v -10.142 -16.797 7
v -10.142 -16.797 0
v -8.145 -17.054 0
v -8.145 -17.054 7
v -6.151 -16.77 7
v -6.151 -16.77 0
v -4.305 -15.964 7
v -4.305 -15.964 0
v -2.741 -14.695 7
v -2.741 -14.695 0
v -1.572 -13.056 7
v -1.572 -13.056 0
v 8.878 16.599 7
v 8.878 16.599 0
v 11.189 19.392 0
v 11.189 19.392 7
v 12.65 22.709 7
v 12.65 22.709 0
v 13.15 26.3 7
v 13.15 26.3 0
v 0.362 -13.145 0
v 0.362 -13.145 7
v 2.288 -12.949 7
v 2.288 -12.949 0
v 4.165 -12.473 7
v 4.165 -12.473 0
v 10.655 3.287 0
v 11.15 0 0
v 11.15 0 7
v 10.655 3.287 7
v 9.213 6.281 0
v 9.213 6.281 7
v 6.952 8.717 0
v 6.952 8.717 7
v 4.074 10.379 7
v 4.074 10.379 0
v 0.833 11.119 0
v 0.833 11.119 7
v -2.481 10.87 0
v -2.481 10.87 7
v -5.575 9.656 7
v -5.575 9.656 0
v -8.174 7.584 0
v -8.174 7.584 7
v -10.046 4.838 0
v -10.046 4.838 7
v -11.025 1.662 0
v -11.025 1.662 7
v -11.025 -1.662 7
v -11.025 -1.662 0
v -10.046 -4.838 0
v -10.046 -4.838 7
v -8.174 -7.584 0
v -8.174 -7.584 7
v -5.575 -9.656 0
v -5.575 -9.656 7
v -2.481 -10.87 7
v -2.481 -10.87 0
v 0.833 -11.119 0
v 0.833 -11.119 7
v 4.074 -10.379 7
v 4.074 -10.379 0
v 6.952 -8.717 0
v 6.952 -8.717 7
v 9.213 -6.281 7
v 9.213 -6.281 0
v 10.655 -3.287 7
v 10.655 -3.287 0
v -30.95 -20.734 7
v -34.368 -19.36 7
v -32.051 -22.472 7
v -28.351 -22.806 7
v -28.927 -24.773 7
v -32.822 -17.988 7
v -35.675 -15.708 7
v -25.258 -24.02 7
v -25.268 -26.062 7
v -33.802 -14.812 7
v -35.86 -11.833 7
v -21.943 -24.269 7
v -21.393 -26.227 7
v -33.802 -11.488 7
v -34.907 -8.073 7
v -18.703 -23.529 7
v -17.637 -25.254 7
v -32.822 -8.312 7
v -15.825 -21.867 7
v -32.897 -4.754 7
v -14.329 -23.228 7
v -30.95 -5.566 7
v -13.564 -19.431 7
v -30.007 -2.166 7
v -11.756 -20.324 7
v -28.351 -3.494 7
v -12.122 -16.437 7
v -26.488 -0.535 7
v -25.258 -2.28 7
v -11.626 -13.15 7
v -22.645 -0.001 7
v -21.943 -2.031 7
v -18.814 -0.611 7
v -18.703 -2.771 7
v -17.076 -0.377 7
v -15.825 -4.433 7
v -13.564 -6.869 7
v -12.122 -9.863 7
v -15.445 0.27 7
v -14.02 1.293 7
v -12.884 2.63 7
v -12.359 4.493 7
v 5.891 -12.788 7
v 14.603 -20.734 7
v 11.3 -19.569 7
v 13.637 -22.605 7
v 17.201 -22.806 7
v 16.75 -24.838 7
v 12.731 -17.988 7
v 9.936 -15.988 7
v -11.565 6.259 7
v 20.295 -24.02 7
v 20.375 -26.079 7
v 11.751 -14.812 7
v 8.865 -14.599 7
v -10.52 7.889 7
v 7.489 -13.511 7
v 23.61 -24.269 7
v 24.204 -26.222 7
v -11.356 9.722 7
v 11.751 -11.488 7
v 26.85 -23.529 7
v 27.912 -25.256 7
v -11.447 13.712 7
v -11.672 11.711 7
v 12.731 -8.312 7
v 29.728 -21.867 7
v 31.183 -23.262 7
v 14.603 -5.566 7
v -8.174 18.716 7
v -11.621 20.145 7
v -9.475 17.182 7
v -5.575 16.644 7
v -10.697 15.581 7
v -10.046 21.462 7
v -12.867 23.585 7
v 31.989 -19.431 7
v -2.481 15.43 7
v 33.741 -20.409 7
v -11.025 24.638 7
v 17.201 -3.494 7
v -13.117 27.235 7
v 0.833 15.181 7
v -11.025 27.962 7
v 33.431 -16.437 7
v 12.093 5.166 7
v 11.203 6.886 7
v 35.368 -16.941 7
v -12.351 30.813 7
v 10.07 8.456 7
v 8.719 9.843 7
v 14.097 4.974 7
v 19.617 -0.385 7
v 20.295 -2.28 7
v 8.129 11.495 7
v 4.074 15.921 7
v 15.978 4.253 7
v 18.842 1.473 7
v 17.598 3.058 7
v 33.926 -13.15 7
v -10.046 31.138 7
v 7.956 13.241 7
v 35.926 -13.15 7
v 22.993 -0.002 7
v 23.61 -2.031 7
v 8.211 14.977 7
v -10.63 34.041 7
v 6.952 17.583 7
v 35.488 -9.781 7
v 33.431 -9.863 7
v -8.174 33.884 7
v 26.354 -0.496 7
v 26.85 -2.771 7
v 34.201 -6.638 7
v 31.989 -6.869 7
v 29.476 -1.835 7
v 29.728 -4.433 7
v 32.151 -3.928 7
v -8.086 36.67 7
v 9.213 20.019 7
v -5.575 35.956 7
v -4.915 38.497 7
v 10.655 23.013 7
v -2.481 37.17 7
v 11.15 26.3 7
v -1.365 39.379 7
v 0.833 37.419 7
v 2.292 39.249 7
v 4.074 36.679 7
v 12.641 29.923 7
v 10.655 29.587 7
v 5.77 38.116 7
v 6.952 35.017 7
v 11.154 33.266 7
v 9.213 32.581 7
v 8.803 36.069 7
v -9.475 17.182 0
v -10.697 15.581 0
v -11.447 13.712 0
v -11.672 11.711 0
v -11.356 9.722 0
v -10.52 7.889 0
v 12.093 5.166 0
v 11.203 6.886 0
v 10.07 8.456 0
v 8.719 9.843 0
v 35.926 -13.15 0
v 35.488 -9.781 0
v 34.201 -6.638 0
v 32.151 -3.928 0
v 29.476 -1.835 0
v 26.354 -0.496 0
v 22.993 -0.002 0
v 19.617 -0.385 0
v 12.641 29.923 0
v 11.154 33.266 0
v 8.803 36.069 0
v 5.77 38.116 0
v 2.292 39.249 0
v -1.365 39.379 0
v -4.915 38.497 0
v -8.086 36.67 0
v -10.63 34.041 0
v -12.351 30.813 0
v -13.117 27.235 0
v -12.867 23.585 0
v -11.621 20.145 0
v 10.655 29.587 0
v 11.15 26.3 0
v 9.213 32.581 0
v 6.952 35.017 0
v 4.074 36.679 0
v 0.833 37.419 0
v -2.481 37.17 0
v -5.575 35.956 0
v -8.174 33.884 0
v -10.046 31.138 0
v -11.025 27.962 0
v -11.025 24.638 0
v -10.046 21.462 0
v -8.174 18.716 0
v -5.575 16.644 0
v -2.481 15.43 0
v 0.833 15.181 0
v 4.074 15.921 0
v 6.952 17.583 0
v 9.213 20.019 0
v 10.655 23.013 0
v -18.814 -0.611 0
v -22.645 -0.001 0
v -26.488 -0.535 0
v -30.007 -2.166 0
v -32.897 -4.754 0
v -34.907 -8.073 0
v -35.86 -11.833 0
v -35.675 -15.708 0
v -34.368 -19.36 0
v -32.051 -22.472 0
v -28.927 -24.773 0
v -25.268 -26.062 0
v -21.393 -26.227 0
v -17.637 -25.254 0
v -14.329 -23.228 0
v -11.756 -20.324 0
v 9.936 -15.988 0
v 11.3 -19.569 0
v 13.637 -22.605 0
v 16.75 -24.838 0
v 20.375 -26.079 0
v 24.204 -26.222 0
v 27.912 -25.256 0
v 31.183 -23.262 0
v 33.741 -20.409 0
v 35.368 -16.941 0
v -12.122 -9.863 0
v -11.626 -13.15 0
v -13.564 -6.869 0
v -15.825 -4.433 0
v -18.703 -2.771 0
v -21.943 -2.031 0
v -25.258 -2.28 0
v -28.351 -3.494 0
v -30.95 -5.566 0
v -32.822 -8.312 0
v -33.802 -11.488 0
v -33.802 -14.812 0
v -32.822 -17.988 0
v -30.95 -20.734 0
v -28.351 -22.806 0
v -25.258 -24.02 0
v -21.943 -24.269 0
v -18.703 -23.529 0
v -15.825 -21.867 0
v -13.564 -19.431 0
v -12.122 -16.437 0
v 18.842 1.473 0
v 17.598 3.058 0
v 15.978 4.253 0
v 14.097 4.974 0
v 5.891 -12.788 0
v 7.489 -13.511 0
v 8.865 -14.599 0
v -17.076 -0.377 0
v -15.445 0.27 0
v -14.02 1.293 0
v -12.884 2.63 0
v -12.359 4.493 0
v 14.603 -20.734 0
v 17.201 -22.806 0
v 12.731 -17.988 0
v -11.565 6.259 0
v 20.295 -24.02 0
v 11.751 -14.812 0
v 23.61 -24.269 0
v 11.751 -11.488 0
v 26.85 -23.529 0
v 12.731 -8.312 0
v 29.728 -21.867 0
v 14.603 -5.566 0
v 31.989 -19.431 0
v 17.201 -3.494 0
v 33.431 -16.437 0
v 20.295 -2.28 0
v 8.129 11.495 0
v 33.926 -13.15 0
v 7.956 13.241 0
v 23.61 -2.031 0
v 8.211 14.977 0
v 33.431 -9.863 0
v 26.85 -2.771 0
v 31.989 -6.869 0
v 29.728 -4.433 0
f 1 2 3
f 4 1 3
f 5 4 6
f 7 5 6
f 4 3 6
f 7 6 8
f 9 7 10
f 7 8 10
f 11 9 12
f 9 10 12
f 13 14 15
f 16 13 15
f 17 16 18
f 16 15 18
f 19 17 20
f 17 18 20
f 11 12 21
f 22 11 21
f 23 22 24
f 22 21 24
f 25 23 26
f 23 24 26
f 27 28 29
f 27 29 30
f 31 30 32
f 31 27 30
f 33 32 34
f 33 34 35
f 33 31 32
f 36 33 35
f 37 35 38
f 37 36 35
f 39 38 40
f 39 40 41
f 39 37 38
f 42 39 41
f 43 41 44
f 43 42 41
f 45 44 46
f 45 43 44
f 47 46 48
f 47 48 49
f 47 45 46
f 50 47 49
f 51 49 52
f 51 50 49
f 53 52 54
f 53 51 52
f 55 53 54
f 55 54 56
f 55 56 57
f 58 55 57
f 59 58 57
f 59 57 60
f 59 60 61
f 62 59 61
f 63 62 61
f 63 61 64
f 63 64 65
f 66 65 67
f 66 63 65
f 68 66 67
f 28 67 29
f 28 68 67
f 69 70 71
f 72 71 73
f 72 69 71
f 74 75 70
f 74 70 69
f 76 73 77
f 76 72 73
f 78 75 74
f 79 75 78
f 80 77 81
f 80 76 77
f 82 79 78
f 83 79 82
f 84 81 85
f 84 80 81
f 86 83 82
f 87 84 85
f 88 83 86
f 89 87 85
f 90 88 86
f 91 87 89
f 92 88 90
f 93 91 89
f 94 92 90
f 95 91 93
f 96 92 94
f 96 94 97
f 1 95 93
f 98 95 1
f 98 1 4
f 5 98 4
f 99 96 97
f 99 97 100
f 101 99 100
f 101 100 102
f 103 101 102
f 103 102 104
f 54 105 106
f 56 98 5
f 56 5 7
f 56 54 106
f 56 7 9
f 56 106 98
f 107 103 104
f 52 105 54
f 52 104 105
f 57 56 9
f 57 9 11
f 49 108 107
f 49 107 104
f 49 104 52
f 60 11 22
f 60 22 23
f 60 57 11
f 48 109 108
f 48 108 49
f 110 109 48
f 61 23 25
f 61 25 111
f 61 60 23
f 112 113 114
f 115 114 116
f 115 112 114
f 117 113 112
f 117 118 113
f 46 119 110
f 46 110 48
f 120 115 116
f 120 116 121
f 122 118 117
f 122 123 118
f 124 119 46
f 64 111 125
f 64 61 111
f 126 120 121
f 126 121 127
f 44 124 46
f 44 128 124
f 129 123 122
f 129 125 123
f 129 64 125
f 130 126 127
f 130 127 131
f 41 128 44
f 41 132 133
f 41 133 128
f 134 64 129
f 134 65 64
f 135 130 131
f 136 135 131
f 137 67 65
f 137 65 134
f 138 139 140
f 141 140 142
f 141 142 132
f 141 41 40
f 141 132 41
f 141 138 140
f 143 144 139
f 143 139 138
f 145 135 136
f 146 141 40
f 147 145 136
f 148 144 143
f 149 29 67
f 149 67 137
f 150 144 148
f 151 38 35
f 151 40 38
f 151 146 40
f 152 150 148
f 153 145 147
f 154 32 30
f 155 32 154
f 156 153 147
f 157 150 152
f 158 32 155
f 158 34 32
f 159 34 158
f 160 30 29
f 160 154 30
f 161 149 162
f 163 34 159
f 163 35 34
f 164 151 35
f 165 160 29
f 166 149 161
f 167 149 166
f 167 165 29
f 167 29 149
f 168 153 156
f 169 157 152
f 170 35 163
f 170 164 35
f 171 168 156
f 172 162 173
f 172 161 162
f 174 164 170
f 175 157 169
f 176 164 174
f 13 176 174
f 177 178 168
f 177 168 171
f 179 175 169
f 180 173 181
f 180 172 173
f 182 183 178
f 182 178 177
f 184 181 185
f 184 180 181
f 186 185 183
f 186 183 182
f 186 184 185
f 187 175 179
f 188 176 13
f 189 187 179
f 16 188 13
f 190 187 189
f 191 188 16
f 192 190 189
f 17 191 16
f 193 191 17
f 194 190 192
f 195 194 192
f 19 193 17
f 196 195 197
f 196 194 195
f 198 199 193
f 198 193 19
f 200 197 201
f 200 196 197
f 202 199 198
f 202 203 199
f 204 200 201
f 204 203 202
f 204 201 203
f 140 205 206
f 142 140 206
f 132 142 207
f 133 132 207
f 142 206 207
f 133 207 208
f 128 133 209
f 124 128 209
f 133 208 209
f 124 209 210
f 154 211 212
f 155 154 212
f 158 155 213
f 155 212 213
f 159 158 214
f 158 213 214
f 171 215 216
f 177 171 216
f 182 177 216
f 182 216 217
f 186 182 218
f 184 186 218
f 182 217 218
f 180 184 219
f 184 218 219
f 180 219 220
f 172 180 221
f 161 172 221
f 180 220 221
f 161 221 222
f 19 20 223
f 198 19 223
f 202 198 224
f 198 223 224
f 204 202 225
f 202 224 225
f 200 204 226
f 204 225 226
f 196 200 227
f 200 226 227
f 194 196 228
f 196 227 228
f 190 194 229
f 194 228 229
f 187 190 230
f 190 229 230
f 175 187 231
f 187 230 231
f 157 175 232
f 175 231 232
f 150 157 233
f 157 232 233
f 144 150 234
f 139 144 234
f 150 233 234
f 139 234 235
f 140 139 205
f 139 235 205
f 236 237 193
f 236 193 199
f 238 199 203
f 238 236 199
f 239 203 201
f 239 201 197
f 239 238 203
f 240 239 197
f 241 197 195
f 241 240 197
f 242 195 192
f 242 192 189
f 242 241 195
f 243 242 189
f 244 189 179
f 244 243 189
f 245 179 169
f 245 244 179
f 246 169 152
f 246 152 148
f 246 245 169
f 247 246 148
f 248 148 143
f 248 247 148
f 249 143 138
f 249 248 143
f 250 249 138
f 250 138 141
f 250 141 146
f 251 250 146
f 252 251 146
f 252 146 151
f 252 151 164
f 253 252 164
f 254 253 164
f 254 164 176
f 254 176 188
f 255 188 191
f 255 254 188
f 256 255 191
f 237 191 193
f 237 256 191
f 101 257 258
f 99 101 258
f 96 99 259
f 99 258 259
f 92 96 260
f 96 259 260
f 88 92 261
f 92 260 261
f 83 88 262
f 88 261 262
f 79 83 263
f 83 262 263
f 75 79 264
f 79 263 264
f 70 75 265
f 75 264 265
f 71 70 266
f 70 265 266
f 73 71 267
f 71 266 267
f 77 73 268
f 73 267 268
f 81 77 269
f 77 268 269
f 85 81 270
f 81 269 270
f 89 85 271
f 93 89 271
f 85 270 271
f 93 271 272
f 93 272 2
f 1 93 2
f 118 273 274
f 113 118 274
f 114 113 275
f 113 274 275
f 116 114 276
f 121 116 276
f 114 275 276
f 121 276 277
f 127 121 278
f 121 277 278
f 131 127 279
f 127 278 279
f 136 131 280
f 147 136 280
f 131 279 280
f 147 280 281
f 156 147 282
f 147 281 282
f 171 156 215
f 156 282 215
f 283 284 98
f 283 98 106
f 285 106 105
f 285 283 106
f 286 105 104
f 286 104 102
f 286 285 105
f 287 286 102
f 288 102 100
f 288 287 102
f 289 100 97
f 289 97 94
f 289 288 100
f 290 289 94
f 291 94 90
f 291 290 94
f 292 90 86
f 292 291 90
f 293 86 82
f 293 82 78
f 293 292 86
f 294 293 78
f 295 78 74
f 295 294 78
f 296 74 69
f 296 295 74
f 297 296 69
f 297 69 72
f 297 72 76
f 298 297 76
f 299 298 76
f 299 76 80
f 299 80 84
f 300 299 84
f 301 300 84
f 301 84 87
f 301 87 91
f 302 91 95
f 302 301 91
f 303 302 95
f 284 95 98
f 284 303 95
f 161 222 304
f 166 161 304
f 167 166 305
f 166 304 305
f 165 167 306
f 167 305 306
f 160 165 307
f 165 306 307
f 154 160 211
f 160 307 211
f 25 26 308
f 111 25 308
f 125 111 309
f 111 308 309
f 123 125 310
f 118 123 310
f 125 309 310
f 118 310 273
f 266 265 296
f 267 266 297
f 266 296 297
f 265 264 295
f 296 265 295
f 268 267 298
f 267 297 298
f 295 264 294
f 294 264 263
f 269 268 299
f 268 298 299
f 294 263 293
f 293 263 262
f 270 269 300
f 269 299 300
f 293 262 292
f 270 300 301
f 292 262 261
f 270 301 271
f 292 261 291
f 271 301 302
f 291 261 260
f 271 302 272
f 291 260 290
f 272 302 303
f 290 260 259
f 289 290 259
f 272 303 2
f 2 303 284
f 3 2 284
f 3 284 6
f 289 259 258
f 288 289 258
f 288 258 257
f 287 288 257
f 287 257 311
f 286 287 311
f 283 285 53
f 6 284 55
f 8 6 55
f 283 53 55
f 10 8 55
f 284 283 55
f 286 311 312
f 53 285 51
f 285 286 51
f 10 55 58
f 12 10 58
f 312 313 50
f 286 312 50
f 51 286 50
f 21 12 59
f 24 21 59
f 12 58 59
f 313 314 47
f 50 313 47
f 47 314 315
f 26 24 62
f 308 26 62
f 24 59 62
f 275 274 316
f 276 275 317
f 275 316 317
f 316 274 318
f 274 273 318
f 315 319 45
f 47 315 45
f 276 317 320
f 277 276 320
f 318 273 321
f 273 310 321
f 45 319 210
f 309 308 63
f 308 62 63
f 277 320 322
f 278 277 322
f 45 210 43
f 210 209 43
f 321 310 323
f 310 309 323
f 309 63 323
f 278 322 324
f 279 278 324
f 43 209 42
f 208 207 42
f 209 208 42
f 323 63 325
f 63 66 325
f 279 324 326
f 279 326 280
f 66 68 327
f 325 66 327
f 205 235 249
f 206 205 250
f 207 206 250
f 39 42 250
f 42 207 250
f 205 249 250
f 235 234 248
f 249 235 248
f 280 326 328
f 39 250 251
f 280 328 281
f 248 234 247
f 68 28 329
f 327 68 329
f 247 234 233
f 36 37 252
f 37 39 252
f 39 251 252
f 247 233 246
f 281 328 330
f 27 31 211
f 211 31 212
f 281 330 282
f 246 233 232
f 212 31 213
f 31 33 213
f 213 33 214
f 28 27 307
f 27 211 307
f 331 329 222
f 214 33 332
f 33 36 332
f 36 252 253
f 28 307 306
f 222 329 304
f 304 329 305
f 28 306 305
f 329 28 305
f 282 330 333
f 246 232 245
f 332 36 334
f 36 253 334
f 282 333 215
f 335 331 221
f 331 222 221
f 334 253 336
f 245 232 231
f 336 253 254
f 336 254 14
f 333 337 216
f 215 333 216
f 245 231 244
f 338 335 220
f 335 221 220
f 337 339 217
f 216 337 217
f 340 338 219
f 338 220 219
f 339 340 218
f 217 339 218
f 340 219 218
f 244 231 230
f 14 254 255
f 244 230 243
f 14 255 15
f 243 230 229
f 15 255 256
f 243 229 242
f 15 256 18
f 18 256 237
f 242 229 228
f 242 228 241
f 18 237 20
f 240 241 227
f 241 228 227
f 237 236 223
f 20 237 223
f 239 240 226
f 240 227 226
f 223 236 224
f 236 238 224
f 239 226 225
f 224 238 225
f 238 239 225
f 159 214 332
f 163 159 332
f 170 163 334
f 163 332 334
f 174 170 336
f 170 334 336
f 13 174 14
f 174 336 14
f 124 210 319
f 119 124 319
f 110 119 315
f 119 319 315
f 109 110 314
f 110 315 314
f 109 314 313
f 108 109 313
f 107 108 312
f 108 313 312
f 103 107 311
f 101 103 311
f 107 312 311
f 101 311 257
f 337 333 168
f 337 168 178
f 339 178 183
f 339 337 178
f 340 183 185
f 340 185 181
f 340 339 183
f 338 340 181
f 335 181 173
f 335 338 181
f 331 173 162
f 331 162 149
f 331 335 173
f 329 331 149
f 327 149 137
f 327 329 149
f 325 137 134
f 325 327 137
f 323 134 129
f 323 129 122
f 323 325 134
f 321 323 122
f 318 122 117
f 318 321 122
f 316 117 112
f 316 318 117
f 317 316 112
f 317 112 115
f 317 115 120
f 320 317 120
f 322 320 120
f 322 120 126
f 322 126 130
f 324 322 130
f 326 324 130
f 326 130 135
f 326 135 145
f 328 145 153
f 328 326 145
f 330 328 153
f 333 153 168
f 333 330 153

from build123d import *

# Parameters (mm, degrees)
F0_R     = 11.15
F1_DEPTH = 7


with BuildPart() as f1:
    # F0 (on Top) → F1 (new body)
    with BuildSketch(Plane.XY):
        with BuildLine():
            ThreePointArc((11.388234, -6.575), (12.701925, -3.403471), (13.15, 0))
            ThreePointArc((13.15, 0), (12.882943, 2.636715), (12.092621, 5.166335))
            ThreePointArc((12.092621, 5.166335), (10.665576, 7.692073), (8.719458, 9.843453))
            ThreePointArc((8.719458, 9.843453), (4.662676, 12.295607), (0, 13.15))
            ThreePointArc((0, 13.15), (-5.881222, 11.761536), (-10.520488, 7.88935))
            ThreePointArc((-10.520488, 7.88935), (-11.994319, 5.390623), (-12.884409, 2.629546))
            ThreePointArc((-12.884409, 2.629546), (-12.979646, -2.109807), (-11.388234, -6.575))
            ThreePointArc((-11.388234, -6.575), (-7.245177, -10.974056), (-1.572133, -13.055684))
            ThreePointArc((-1.572133, -13.055684), (1.328743, -13.082696), (4.164951, -12.472998))
            ThreePointArc((4.164951, -12.472998), (8.31697, -10.1858), (11.388234, -6.575))
        make_face()
        Circle(F0_R, mode=Mode.SUBTRACT)
        with BuildLine():
            ThreePointArc((12.092621, 5.166335), (12.882943, 2.636715), (13.15, 0))
            ThreePointArc((13.15, 0), (12.701925, -3.403471), (11.388234, -6.575))
            ThreePointArc((11.388234, -6.575), (14.871744, -2.641059), (19.617412, -0.385093))
            ThreePointArc((19.617412, -0.385093), (16.82857, 3.710244), (12.092621, 5.166335))
        make_face()
        with BuildLine():
            ThreePointArc((9.936386, -15.988096), (9.780145, -11.145485), (11.388234, -6.575))
            ThreePointArc((11.388234, -6.575), (8.31697, -10.1858), (4.164951, -12.472998))
            ThreePointArc((4.164951, -12.472998), (7.488877, -13.511052), (9.936386, -15.988096))
        make_face()
        with BuildLine():
            ThreePointArc((19.617412, -0.385093), (14.871744, -2.641059), (11.388234, -6.575))
            ThreePointArc((11.388234, -6.575), (9.780145, -11.145485), (9.936386, -15.988096))
            ThreePointArc((9.936386, -15.988096), (24.203952, -26.222291), (35.926468, -13.15))
            ThreePointArc((35.926468, -13.15), (30.881433, -2.794709), (19.617412, -0.385093))
        make_face()
        with Locations((22.776468, -13.15)):
            Circle(F0_R, mode=Mode.SUBTRACT)
        with BuildLine():
            ThreePointArc((0, 13.15), (4.662676, 12.295607), (8.719458, 9.843453))
            ThreePointArc((8.719458, 9.843453), (7.956476, 13.241084), (8.877904, 16.59921))
            ThreePointArc((8.877904, 16.59921), (4.762201, 14.042596), (0, 13.15))
        make_face()
        with BuildLine():
            ThreePointArc((-10.520488, 7.88935), (-5.881222, 11.761536), (0, 13.15))
            ThreePointArc((0, 13.15), (-5.148648, 14.199838), (-9.475206, 17.181723))
            ThreePointArc((-9.475206, 17.181723), (-11.627451, 12.718847), (-10.520488, 7.88935))
        make_face()
        with BuildLine():
            ThreePointArc((-9.475206, 17.181723), (-5.148648, 14.199838), (0, 13.15))
            ThreePointArc((0, 13.15), (4.762201, 14.042596), (8.877904, 16.59921))
            ThreePointArc((8.877904, 16.59921), (12.034678, 21.000091), (13.15, 26.3))
            ThreePointArc((13.15, 26.3), (-4.915463, 38.496751), (-9.475206, 17.181723))
        make_face()
        with Locations((0, 26.3)):
            Circle(F0_R, mode=Mode.SUBTRACT)
        with BuildLine():
            ThreePointArc((-10.142206, -16.79663), (-5.20112, -16.429091), (-1.572133, -13.055684))
            ThreePointArc((-1.572133, -13.055684), (-7.245177, -10.974056), (-11.388234, -6.575))
            ThreePointArc((-11.388234, -6.575), (-10.074543, -9.74653), (-9.626468, -13.15))
            ThreePointArc((-9.626468, -13.15), (-9.756041, -14.99146), (-10.142206, -16.79663))
        make_face()
        with BuildLine():
            ThreePointArc((-18.81429, -0.611115), (-14.542346, -2.897111), (-11.388234, -6.575))
            ThreePointArc((-11.388234, -6.575), (-12.979646, -2.109807), (-12.884409, 2.629546))
            ThreePointArc((-12.884409, 2.629546), (-15.445353, 0.269968), (-18.81429, -0.611115))
        make_face()
        with BuildLine():
            ThreePointArc((-9.626468, -13.15), (-10.074543, -9.74653), (-11.388234, -6.575))
            ThreePointArc((-11.388234, -6.575), (-14.542346, -2.897111), (-18.81429, -0.611115))
            ThreePointArc((-18.81429, -0.611115), (-34.367551, -19.360419), (-10.142206, -16.79663))
            ThreePointArc((-10.142206, -16.79663), (-9.756041, -14.99146), (-9.626468, -13.15))
        make_face()
        with Locations((-22.776468, -13.15)):
            Circle(F0_R, mode=Mode.SUBTRACT)
    extrude(amount=F1_DEPTH)


solid = f1.part
